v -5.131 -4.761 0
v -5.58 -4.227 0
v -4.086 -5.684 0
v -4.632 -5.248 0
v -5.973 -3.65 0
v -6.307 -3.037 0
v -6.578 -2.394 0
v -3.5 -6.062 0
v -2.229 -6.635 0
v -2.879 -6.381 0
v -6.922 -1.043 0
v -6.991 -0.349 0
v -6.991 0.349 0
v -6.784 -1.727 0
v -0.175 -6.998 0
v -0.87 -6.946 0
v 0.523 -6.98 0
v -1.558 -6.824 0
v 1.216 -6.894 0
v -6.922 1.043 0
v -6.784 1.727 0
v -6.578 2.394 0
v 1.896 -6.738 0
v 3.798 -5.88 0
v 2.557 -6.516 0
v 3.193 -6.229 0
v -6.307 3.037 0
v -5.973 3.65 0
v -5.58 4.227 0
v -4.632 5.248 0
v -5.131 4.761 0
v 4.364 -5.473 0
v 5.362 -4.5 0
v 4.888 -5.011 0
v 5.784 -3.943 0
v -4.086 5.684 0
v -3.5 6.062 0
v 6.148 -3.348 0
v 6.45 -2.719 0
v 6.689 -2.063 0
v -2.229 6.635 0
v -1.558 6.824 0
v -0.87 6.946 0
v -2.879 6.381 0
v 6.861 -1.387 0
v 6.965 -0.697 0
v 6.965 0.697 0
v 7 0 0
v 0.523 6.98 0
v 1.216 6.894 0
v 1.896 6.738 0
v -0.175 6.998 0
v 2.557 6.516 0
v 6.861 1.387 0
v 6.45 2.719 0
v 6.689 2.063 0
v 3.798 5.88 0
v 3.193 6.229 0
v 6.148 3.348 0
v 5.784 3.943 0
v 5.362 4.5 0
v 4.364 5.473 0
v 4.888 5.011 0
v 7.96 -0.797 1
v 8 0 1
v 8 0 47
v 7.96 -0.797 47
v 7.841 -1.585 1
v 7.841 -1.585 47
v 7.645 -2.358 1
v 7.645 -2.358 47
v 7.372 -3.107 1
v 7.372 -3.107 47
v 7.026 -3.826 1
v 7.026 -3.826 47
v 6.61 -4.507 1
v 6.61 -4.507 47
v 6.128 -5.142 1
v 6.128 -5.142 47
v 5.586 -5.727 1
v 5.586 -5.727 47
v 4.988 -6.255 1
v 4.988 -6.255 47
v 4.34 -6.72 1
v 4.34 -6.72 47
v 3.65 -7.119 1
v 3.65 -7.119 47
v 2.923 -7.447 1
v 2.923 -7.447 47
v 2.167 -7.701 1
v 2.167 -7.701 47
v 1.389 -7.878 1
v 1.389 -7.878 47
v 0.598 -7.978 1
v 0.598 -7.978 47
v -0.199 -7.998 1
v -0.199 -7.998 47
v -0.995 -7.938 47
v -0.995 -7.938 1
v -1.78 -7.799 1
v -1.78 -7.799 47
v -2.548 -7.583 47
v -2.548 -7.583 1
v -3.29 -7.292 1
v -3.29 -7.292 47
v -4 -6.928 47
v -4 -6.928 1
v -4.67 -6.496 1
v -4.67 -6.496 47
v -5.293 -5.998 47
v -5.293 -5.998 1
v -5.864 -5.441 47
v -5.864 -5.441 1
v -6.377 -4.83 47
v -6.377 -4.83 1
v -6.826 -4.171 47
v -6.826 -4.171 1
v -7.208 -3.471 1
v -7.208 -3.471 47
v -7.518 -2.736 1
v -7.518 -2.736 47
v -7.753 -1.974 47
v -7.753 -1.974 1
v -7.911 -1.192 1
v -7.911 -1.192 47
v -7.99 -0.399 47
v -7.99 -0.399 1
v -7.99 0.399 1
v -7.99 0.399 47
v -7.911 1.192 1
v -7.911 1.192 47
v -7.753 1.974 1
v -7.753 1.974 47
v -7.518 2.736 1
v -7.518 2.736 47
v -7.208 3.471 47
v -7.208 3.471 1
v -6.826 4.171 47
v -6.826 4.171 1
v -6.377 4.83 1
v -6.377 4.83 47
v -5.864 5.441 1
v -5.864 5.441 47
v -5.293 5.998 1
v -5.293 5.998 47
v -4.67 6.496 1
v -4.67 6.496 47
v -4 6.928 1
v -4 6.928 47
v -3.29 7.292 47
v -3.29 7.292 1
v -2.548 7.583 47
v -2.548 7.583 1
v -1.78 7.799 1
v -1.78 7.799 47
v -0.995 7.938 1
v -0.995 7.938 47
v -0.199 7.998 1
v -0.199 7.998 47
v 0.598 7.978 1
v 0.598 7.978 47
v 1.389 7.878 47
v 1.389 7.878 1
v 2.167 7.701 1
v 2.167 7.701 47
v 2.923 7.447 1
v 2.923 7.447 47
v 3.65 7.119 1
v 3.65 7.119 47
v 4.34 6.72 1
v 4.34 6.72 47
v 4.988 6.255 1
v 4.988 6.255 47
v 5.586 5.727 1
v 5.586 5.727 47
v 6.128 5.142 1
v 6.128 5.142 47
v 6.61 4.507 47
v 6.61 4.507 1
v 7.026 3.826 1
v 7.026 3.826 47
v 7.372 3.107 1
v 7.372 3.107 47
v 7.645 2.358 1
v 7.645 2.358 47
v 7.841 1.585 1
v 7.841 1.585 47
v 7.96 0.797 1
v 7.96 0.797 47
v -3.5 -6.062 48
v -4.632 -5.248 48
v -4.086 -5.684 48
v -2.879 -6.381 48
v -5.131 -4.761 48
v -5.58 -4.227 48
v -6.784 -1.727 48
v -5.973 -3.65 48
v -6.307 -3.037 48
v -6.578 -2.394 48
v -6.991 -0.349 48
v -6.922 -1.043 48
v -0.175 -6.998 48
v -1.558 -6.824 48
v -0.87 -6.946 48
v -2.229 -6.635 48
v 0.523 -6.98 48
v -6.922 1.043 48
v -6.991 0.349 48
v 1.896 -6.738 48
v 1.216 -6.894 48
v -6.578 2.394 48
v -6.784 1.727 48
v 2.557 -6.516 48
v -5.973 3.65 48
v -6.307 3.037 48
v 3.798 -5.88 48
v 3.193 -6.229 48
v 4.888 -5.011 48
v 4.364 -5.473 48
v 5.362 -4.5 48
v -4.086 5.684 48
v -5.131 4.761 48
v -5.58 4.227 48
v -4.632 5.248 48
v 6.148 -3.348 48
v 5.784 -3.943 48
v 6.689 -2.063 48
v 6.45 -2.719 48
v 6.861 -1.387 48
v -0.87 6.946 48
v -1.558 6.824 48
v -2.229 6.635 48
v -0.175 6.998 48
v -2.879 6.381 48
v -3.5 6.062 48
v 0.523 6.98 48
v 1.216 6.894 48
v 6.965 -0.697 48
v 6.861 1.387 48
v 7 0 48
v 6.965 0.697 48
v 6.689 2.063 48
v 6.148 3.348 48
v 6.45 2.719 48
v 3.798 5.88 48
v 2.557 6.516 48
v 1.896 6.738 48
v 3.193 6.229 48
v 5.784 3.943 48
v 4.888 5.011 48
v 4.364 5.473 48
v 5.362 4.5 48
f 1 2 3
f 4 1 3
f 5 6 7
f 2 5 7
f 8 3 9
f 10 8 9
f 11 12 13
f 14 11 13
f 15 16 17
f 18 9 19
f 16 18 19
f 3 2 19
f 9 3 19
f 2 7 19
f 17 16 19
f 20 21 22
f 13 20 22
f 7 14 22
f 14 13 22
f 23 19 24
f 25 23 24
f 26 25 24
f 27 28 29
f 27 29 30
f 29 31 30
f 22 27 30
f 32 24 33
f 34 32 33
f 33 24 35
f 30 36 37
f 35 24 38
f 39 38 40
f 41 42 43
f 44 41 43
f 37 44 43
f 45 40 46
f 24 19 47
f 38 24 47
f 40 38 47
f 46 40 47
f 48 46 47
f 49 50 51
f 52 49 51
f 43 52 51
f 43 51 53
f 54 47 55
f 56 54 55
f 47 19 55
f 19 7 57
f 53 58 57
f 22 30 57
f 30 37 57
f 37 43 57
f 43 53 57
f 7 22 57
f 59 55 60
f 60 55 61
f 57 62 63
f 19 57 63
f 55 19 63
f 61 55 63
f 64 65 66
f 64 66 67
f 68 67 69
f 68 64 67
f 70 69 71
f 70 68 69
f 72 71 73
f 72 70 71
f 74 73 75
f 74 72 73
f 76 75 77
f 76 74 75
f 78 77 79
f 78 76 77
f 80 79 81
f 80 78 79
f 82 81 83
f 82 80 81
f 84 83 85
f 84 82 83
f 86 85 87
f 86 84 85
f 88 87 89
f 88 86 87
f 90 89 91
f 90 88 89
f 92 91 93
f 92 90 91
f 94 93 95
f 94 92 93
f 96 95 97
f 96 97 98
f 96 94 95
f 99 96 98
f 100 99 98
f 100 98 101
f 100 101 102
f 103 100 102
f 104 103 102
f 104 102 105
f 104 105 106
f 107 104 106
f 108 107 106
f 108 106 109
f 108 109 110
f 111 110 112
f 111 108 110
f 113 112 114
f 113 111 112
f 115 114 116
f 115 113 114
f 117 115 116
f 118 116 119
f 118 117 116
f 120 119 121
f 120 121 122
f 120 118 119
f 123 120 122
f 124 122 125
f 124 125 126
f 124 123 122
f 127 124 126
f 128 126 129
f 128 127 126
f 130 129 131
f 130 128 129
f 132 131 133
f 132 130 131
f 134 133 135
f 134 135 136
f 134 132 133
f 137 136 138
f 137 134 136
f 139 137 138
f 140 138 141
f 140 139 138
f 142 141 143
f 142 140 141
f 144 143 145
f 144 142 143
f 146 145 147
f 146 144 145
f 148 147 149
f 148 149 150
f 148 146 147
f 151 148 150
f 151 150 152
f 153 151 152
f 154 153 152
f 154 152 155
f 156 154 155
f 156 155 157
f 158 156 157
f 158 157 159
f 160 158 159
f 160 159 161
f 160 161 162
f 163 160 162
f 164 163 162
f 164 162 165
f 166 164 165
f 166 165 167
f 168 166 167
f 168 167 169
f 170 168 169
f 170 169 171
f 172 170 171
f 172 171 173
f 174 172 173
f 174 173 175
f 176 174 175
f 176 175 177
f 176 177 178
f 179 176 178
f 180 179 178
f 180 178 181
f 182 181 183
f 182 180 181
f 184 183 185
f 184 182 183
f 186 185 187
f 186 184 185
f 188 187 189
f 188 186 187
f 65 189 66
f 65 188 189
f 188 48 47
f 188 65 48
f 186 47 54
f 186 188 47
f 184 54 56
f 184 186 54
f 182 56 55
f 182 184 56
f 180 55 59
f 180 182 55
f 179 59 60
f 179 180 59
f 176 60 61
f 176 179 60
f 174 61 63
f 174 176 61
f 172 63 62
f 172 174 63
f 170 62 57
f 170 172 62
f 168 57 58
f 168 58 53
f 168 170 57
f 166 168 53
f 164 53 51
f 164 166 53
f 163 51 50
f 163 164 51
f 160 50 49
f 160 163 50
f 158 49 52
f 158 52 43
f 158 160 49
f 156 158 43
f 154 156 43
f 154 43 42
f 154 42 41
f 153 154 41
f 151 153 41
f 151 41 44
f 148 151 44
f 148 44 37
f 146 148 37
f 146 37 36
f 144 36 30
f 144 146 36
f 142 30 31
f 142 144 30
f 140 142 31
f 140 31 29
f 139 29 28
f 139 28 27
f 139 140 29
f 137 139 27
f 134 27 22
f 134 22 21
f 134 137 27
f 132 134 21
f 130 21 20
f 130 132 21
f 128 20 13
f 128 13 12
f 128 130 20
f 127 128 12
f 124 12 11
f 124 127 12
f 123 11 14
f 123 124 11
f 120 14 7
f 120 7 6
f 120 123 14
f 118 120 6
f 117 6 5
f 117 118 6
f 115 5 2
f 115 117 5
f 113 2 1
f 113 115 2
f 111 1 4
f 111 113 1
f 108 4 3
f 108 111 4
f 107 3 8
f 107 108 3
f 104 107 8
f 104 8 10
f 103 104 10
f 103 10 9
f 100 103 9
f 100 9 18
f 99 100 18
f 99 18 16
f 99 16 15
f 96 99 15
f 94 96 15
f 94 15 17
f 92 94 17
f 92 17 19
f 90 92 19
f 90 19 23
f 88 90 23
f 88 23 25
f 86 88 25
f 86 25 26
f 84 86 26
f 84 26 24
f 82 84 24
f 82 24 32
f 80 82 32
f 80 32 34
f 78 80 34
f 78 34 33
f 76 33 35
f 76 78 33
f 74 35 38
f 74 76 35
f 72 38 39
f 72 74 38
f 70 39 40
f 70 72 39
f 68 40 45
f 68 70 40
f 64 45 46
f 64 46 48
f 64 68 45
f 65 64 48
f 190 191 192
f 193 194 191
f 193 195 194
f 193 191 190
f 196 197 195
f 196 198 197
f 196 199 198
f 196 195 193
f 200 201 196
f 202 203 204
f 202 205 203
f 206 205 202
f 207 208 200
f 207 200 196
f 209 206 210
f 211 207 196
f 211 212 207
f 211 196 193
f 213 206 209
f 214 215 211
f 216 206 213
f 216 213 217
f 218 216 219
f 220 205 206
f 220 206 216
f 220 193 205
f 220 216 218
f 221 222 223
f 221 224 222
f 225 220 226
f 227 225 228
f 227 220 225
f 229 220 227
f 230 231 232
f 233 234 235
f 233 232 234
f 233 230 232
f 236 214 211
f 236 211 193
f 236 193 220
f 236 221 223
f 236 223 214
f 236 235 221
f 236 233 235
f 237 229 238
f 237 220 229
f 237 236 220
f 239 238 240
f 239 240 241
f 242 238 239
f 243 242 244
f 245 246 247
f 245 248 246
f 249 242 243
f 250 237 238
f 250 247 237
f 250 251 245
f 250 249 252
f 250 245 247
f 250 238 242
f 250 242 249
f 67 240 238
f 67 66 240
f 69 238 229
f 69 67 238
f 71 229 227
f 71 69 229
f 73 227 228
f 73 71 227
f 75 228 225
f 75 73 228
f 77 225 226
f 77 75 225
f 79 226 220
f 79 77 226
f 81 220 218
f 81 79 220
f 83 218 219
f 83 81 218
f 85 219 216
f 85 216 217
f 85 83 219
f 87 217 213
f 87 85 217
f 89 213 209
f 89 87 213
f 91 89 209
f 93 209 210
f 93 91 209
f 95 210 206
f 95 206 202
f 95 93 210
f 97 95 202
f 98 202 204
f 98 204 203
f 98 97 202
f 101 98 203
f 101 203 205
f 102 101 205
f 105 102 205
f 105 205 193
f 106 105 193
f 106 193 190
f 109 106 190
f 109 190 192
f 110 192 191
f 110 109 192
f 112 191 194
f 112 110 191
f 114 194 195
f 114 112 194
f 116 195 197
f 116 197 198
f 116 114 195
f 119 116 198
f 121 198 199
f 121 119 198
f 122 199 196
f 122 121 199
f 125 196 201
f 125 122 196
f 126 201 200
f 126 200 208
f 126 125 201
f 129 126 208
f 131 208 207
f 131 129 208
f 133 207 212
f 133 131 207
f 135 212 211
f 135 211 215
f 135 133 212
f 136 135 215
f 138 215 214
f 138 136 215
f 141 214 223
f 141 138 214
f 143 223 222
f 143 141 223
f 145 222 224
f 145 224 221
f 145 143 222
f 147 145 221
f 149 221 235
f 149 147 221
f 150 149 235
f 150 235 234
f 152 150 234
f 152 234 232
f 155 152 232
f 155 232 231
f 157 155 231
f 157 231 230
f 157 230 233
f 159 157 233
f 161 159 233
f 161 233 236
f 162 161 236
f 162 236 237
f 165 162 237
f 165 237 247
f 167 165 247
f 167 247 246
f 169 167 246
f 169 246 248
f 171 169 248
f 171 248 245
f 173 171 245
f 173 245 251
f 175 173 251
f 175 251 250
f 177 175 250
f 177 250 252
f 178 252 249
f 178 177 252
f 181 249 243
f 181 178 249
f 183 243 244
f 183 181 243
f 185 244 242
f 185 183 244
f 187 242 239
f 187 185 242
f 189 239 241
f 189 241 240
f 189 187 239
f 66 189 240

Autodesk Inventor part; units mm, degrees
ref_plane "YZ Plane" through (0, 0, 0) normal (1, 0, 0) x (0, 1, 0)
ref_plane "XZ Plane" through (0, 0, 0) normal (0, 1, 0) x (-1, 0, 0)
ref_plane "XY Plane" through (0, 0, 0) normal (0, 0, 1) x (1, 0, 0)
sketch "Sketch1" plane through (0, 0, 0) normal (0, 0, 1) x (1, 0, 0)
  line L0 (-11.2, 0) -> (11.2, 0) projected
  line L1 (0, -11.2) -> (0, 11.2) projected
  circle A0 centre (0, 0) radius 8
  dimension "d0" = 8
extrude "Extrusion1" add sketch "Sketch1" along normal blind 48
chamfer "Chamfer1" distance 1 angle 45 1 edges at (-8, 0, 48)
chamfer "Chamfer2" distance 1 angle 45 1 edges at (-8, 0, 0)
properties part number "Ax"
